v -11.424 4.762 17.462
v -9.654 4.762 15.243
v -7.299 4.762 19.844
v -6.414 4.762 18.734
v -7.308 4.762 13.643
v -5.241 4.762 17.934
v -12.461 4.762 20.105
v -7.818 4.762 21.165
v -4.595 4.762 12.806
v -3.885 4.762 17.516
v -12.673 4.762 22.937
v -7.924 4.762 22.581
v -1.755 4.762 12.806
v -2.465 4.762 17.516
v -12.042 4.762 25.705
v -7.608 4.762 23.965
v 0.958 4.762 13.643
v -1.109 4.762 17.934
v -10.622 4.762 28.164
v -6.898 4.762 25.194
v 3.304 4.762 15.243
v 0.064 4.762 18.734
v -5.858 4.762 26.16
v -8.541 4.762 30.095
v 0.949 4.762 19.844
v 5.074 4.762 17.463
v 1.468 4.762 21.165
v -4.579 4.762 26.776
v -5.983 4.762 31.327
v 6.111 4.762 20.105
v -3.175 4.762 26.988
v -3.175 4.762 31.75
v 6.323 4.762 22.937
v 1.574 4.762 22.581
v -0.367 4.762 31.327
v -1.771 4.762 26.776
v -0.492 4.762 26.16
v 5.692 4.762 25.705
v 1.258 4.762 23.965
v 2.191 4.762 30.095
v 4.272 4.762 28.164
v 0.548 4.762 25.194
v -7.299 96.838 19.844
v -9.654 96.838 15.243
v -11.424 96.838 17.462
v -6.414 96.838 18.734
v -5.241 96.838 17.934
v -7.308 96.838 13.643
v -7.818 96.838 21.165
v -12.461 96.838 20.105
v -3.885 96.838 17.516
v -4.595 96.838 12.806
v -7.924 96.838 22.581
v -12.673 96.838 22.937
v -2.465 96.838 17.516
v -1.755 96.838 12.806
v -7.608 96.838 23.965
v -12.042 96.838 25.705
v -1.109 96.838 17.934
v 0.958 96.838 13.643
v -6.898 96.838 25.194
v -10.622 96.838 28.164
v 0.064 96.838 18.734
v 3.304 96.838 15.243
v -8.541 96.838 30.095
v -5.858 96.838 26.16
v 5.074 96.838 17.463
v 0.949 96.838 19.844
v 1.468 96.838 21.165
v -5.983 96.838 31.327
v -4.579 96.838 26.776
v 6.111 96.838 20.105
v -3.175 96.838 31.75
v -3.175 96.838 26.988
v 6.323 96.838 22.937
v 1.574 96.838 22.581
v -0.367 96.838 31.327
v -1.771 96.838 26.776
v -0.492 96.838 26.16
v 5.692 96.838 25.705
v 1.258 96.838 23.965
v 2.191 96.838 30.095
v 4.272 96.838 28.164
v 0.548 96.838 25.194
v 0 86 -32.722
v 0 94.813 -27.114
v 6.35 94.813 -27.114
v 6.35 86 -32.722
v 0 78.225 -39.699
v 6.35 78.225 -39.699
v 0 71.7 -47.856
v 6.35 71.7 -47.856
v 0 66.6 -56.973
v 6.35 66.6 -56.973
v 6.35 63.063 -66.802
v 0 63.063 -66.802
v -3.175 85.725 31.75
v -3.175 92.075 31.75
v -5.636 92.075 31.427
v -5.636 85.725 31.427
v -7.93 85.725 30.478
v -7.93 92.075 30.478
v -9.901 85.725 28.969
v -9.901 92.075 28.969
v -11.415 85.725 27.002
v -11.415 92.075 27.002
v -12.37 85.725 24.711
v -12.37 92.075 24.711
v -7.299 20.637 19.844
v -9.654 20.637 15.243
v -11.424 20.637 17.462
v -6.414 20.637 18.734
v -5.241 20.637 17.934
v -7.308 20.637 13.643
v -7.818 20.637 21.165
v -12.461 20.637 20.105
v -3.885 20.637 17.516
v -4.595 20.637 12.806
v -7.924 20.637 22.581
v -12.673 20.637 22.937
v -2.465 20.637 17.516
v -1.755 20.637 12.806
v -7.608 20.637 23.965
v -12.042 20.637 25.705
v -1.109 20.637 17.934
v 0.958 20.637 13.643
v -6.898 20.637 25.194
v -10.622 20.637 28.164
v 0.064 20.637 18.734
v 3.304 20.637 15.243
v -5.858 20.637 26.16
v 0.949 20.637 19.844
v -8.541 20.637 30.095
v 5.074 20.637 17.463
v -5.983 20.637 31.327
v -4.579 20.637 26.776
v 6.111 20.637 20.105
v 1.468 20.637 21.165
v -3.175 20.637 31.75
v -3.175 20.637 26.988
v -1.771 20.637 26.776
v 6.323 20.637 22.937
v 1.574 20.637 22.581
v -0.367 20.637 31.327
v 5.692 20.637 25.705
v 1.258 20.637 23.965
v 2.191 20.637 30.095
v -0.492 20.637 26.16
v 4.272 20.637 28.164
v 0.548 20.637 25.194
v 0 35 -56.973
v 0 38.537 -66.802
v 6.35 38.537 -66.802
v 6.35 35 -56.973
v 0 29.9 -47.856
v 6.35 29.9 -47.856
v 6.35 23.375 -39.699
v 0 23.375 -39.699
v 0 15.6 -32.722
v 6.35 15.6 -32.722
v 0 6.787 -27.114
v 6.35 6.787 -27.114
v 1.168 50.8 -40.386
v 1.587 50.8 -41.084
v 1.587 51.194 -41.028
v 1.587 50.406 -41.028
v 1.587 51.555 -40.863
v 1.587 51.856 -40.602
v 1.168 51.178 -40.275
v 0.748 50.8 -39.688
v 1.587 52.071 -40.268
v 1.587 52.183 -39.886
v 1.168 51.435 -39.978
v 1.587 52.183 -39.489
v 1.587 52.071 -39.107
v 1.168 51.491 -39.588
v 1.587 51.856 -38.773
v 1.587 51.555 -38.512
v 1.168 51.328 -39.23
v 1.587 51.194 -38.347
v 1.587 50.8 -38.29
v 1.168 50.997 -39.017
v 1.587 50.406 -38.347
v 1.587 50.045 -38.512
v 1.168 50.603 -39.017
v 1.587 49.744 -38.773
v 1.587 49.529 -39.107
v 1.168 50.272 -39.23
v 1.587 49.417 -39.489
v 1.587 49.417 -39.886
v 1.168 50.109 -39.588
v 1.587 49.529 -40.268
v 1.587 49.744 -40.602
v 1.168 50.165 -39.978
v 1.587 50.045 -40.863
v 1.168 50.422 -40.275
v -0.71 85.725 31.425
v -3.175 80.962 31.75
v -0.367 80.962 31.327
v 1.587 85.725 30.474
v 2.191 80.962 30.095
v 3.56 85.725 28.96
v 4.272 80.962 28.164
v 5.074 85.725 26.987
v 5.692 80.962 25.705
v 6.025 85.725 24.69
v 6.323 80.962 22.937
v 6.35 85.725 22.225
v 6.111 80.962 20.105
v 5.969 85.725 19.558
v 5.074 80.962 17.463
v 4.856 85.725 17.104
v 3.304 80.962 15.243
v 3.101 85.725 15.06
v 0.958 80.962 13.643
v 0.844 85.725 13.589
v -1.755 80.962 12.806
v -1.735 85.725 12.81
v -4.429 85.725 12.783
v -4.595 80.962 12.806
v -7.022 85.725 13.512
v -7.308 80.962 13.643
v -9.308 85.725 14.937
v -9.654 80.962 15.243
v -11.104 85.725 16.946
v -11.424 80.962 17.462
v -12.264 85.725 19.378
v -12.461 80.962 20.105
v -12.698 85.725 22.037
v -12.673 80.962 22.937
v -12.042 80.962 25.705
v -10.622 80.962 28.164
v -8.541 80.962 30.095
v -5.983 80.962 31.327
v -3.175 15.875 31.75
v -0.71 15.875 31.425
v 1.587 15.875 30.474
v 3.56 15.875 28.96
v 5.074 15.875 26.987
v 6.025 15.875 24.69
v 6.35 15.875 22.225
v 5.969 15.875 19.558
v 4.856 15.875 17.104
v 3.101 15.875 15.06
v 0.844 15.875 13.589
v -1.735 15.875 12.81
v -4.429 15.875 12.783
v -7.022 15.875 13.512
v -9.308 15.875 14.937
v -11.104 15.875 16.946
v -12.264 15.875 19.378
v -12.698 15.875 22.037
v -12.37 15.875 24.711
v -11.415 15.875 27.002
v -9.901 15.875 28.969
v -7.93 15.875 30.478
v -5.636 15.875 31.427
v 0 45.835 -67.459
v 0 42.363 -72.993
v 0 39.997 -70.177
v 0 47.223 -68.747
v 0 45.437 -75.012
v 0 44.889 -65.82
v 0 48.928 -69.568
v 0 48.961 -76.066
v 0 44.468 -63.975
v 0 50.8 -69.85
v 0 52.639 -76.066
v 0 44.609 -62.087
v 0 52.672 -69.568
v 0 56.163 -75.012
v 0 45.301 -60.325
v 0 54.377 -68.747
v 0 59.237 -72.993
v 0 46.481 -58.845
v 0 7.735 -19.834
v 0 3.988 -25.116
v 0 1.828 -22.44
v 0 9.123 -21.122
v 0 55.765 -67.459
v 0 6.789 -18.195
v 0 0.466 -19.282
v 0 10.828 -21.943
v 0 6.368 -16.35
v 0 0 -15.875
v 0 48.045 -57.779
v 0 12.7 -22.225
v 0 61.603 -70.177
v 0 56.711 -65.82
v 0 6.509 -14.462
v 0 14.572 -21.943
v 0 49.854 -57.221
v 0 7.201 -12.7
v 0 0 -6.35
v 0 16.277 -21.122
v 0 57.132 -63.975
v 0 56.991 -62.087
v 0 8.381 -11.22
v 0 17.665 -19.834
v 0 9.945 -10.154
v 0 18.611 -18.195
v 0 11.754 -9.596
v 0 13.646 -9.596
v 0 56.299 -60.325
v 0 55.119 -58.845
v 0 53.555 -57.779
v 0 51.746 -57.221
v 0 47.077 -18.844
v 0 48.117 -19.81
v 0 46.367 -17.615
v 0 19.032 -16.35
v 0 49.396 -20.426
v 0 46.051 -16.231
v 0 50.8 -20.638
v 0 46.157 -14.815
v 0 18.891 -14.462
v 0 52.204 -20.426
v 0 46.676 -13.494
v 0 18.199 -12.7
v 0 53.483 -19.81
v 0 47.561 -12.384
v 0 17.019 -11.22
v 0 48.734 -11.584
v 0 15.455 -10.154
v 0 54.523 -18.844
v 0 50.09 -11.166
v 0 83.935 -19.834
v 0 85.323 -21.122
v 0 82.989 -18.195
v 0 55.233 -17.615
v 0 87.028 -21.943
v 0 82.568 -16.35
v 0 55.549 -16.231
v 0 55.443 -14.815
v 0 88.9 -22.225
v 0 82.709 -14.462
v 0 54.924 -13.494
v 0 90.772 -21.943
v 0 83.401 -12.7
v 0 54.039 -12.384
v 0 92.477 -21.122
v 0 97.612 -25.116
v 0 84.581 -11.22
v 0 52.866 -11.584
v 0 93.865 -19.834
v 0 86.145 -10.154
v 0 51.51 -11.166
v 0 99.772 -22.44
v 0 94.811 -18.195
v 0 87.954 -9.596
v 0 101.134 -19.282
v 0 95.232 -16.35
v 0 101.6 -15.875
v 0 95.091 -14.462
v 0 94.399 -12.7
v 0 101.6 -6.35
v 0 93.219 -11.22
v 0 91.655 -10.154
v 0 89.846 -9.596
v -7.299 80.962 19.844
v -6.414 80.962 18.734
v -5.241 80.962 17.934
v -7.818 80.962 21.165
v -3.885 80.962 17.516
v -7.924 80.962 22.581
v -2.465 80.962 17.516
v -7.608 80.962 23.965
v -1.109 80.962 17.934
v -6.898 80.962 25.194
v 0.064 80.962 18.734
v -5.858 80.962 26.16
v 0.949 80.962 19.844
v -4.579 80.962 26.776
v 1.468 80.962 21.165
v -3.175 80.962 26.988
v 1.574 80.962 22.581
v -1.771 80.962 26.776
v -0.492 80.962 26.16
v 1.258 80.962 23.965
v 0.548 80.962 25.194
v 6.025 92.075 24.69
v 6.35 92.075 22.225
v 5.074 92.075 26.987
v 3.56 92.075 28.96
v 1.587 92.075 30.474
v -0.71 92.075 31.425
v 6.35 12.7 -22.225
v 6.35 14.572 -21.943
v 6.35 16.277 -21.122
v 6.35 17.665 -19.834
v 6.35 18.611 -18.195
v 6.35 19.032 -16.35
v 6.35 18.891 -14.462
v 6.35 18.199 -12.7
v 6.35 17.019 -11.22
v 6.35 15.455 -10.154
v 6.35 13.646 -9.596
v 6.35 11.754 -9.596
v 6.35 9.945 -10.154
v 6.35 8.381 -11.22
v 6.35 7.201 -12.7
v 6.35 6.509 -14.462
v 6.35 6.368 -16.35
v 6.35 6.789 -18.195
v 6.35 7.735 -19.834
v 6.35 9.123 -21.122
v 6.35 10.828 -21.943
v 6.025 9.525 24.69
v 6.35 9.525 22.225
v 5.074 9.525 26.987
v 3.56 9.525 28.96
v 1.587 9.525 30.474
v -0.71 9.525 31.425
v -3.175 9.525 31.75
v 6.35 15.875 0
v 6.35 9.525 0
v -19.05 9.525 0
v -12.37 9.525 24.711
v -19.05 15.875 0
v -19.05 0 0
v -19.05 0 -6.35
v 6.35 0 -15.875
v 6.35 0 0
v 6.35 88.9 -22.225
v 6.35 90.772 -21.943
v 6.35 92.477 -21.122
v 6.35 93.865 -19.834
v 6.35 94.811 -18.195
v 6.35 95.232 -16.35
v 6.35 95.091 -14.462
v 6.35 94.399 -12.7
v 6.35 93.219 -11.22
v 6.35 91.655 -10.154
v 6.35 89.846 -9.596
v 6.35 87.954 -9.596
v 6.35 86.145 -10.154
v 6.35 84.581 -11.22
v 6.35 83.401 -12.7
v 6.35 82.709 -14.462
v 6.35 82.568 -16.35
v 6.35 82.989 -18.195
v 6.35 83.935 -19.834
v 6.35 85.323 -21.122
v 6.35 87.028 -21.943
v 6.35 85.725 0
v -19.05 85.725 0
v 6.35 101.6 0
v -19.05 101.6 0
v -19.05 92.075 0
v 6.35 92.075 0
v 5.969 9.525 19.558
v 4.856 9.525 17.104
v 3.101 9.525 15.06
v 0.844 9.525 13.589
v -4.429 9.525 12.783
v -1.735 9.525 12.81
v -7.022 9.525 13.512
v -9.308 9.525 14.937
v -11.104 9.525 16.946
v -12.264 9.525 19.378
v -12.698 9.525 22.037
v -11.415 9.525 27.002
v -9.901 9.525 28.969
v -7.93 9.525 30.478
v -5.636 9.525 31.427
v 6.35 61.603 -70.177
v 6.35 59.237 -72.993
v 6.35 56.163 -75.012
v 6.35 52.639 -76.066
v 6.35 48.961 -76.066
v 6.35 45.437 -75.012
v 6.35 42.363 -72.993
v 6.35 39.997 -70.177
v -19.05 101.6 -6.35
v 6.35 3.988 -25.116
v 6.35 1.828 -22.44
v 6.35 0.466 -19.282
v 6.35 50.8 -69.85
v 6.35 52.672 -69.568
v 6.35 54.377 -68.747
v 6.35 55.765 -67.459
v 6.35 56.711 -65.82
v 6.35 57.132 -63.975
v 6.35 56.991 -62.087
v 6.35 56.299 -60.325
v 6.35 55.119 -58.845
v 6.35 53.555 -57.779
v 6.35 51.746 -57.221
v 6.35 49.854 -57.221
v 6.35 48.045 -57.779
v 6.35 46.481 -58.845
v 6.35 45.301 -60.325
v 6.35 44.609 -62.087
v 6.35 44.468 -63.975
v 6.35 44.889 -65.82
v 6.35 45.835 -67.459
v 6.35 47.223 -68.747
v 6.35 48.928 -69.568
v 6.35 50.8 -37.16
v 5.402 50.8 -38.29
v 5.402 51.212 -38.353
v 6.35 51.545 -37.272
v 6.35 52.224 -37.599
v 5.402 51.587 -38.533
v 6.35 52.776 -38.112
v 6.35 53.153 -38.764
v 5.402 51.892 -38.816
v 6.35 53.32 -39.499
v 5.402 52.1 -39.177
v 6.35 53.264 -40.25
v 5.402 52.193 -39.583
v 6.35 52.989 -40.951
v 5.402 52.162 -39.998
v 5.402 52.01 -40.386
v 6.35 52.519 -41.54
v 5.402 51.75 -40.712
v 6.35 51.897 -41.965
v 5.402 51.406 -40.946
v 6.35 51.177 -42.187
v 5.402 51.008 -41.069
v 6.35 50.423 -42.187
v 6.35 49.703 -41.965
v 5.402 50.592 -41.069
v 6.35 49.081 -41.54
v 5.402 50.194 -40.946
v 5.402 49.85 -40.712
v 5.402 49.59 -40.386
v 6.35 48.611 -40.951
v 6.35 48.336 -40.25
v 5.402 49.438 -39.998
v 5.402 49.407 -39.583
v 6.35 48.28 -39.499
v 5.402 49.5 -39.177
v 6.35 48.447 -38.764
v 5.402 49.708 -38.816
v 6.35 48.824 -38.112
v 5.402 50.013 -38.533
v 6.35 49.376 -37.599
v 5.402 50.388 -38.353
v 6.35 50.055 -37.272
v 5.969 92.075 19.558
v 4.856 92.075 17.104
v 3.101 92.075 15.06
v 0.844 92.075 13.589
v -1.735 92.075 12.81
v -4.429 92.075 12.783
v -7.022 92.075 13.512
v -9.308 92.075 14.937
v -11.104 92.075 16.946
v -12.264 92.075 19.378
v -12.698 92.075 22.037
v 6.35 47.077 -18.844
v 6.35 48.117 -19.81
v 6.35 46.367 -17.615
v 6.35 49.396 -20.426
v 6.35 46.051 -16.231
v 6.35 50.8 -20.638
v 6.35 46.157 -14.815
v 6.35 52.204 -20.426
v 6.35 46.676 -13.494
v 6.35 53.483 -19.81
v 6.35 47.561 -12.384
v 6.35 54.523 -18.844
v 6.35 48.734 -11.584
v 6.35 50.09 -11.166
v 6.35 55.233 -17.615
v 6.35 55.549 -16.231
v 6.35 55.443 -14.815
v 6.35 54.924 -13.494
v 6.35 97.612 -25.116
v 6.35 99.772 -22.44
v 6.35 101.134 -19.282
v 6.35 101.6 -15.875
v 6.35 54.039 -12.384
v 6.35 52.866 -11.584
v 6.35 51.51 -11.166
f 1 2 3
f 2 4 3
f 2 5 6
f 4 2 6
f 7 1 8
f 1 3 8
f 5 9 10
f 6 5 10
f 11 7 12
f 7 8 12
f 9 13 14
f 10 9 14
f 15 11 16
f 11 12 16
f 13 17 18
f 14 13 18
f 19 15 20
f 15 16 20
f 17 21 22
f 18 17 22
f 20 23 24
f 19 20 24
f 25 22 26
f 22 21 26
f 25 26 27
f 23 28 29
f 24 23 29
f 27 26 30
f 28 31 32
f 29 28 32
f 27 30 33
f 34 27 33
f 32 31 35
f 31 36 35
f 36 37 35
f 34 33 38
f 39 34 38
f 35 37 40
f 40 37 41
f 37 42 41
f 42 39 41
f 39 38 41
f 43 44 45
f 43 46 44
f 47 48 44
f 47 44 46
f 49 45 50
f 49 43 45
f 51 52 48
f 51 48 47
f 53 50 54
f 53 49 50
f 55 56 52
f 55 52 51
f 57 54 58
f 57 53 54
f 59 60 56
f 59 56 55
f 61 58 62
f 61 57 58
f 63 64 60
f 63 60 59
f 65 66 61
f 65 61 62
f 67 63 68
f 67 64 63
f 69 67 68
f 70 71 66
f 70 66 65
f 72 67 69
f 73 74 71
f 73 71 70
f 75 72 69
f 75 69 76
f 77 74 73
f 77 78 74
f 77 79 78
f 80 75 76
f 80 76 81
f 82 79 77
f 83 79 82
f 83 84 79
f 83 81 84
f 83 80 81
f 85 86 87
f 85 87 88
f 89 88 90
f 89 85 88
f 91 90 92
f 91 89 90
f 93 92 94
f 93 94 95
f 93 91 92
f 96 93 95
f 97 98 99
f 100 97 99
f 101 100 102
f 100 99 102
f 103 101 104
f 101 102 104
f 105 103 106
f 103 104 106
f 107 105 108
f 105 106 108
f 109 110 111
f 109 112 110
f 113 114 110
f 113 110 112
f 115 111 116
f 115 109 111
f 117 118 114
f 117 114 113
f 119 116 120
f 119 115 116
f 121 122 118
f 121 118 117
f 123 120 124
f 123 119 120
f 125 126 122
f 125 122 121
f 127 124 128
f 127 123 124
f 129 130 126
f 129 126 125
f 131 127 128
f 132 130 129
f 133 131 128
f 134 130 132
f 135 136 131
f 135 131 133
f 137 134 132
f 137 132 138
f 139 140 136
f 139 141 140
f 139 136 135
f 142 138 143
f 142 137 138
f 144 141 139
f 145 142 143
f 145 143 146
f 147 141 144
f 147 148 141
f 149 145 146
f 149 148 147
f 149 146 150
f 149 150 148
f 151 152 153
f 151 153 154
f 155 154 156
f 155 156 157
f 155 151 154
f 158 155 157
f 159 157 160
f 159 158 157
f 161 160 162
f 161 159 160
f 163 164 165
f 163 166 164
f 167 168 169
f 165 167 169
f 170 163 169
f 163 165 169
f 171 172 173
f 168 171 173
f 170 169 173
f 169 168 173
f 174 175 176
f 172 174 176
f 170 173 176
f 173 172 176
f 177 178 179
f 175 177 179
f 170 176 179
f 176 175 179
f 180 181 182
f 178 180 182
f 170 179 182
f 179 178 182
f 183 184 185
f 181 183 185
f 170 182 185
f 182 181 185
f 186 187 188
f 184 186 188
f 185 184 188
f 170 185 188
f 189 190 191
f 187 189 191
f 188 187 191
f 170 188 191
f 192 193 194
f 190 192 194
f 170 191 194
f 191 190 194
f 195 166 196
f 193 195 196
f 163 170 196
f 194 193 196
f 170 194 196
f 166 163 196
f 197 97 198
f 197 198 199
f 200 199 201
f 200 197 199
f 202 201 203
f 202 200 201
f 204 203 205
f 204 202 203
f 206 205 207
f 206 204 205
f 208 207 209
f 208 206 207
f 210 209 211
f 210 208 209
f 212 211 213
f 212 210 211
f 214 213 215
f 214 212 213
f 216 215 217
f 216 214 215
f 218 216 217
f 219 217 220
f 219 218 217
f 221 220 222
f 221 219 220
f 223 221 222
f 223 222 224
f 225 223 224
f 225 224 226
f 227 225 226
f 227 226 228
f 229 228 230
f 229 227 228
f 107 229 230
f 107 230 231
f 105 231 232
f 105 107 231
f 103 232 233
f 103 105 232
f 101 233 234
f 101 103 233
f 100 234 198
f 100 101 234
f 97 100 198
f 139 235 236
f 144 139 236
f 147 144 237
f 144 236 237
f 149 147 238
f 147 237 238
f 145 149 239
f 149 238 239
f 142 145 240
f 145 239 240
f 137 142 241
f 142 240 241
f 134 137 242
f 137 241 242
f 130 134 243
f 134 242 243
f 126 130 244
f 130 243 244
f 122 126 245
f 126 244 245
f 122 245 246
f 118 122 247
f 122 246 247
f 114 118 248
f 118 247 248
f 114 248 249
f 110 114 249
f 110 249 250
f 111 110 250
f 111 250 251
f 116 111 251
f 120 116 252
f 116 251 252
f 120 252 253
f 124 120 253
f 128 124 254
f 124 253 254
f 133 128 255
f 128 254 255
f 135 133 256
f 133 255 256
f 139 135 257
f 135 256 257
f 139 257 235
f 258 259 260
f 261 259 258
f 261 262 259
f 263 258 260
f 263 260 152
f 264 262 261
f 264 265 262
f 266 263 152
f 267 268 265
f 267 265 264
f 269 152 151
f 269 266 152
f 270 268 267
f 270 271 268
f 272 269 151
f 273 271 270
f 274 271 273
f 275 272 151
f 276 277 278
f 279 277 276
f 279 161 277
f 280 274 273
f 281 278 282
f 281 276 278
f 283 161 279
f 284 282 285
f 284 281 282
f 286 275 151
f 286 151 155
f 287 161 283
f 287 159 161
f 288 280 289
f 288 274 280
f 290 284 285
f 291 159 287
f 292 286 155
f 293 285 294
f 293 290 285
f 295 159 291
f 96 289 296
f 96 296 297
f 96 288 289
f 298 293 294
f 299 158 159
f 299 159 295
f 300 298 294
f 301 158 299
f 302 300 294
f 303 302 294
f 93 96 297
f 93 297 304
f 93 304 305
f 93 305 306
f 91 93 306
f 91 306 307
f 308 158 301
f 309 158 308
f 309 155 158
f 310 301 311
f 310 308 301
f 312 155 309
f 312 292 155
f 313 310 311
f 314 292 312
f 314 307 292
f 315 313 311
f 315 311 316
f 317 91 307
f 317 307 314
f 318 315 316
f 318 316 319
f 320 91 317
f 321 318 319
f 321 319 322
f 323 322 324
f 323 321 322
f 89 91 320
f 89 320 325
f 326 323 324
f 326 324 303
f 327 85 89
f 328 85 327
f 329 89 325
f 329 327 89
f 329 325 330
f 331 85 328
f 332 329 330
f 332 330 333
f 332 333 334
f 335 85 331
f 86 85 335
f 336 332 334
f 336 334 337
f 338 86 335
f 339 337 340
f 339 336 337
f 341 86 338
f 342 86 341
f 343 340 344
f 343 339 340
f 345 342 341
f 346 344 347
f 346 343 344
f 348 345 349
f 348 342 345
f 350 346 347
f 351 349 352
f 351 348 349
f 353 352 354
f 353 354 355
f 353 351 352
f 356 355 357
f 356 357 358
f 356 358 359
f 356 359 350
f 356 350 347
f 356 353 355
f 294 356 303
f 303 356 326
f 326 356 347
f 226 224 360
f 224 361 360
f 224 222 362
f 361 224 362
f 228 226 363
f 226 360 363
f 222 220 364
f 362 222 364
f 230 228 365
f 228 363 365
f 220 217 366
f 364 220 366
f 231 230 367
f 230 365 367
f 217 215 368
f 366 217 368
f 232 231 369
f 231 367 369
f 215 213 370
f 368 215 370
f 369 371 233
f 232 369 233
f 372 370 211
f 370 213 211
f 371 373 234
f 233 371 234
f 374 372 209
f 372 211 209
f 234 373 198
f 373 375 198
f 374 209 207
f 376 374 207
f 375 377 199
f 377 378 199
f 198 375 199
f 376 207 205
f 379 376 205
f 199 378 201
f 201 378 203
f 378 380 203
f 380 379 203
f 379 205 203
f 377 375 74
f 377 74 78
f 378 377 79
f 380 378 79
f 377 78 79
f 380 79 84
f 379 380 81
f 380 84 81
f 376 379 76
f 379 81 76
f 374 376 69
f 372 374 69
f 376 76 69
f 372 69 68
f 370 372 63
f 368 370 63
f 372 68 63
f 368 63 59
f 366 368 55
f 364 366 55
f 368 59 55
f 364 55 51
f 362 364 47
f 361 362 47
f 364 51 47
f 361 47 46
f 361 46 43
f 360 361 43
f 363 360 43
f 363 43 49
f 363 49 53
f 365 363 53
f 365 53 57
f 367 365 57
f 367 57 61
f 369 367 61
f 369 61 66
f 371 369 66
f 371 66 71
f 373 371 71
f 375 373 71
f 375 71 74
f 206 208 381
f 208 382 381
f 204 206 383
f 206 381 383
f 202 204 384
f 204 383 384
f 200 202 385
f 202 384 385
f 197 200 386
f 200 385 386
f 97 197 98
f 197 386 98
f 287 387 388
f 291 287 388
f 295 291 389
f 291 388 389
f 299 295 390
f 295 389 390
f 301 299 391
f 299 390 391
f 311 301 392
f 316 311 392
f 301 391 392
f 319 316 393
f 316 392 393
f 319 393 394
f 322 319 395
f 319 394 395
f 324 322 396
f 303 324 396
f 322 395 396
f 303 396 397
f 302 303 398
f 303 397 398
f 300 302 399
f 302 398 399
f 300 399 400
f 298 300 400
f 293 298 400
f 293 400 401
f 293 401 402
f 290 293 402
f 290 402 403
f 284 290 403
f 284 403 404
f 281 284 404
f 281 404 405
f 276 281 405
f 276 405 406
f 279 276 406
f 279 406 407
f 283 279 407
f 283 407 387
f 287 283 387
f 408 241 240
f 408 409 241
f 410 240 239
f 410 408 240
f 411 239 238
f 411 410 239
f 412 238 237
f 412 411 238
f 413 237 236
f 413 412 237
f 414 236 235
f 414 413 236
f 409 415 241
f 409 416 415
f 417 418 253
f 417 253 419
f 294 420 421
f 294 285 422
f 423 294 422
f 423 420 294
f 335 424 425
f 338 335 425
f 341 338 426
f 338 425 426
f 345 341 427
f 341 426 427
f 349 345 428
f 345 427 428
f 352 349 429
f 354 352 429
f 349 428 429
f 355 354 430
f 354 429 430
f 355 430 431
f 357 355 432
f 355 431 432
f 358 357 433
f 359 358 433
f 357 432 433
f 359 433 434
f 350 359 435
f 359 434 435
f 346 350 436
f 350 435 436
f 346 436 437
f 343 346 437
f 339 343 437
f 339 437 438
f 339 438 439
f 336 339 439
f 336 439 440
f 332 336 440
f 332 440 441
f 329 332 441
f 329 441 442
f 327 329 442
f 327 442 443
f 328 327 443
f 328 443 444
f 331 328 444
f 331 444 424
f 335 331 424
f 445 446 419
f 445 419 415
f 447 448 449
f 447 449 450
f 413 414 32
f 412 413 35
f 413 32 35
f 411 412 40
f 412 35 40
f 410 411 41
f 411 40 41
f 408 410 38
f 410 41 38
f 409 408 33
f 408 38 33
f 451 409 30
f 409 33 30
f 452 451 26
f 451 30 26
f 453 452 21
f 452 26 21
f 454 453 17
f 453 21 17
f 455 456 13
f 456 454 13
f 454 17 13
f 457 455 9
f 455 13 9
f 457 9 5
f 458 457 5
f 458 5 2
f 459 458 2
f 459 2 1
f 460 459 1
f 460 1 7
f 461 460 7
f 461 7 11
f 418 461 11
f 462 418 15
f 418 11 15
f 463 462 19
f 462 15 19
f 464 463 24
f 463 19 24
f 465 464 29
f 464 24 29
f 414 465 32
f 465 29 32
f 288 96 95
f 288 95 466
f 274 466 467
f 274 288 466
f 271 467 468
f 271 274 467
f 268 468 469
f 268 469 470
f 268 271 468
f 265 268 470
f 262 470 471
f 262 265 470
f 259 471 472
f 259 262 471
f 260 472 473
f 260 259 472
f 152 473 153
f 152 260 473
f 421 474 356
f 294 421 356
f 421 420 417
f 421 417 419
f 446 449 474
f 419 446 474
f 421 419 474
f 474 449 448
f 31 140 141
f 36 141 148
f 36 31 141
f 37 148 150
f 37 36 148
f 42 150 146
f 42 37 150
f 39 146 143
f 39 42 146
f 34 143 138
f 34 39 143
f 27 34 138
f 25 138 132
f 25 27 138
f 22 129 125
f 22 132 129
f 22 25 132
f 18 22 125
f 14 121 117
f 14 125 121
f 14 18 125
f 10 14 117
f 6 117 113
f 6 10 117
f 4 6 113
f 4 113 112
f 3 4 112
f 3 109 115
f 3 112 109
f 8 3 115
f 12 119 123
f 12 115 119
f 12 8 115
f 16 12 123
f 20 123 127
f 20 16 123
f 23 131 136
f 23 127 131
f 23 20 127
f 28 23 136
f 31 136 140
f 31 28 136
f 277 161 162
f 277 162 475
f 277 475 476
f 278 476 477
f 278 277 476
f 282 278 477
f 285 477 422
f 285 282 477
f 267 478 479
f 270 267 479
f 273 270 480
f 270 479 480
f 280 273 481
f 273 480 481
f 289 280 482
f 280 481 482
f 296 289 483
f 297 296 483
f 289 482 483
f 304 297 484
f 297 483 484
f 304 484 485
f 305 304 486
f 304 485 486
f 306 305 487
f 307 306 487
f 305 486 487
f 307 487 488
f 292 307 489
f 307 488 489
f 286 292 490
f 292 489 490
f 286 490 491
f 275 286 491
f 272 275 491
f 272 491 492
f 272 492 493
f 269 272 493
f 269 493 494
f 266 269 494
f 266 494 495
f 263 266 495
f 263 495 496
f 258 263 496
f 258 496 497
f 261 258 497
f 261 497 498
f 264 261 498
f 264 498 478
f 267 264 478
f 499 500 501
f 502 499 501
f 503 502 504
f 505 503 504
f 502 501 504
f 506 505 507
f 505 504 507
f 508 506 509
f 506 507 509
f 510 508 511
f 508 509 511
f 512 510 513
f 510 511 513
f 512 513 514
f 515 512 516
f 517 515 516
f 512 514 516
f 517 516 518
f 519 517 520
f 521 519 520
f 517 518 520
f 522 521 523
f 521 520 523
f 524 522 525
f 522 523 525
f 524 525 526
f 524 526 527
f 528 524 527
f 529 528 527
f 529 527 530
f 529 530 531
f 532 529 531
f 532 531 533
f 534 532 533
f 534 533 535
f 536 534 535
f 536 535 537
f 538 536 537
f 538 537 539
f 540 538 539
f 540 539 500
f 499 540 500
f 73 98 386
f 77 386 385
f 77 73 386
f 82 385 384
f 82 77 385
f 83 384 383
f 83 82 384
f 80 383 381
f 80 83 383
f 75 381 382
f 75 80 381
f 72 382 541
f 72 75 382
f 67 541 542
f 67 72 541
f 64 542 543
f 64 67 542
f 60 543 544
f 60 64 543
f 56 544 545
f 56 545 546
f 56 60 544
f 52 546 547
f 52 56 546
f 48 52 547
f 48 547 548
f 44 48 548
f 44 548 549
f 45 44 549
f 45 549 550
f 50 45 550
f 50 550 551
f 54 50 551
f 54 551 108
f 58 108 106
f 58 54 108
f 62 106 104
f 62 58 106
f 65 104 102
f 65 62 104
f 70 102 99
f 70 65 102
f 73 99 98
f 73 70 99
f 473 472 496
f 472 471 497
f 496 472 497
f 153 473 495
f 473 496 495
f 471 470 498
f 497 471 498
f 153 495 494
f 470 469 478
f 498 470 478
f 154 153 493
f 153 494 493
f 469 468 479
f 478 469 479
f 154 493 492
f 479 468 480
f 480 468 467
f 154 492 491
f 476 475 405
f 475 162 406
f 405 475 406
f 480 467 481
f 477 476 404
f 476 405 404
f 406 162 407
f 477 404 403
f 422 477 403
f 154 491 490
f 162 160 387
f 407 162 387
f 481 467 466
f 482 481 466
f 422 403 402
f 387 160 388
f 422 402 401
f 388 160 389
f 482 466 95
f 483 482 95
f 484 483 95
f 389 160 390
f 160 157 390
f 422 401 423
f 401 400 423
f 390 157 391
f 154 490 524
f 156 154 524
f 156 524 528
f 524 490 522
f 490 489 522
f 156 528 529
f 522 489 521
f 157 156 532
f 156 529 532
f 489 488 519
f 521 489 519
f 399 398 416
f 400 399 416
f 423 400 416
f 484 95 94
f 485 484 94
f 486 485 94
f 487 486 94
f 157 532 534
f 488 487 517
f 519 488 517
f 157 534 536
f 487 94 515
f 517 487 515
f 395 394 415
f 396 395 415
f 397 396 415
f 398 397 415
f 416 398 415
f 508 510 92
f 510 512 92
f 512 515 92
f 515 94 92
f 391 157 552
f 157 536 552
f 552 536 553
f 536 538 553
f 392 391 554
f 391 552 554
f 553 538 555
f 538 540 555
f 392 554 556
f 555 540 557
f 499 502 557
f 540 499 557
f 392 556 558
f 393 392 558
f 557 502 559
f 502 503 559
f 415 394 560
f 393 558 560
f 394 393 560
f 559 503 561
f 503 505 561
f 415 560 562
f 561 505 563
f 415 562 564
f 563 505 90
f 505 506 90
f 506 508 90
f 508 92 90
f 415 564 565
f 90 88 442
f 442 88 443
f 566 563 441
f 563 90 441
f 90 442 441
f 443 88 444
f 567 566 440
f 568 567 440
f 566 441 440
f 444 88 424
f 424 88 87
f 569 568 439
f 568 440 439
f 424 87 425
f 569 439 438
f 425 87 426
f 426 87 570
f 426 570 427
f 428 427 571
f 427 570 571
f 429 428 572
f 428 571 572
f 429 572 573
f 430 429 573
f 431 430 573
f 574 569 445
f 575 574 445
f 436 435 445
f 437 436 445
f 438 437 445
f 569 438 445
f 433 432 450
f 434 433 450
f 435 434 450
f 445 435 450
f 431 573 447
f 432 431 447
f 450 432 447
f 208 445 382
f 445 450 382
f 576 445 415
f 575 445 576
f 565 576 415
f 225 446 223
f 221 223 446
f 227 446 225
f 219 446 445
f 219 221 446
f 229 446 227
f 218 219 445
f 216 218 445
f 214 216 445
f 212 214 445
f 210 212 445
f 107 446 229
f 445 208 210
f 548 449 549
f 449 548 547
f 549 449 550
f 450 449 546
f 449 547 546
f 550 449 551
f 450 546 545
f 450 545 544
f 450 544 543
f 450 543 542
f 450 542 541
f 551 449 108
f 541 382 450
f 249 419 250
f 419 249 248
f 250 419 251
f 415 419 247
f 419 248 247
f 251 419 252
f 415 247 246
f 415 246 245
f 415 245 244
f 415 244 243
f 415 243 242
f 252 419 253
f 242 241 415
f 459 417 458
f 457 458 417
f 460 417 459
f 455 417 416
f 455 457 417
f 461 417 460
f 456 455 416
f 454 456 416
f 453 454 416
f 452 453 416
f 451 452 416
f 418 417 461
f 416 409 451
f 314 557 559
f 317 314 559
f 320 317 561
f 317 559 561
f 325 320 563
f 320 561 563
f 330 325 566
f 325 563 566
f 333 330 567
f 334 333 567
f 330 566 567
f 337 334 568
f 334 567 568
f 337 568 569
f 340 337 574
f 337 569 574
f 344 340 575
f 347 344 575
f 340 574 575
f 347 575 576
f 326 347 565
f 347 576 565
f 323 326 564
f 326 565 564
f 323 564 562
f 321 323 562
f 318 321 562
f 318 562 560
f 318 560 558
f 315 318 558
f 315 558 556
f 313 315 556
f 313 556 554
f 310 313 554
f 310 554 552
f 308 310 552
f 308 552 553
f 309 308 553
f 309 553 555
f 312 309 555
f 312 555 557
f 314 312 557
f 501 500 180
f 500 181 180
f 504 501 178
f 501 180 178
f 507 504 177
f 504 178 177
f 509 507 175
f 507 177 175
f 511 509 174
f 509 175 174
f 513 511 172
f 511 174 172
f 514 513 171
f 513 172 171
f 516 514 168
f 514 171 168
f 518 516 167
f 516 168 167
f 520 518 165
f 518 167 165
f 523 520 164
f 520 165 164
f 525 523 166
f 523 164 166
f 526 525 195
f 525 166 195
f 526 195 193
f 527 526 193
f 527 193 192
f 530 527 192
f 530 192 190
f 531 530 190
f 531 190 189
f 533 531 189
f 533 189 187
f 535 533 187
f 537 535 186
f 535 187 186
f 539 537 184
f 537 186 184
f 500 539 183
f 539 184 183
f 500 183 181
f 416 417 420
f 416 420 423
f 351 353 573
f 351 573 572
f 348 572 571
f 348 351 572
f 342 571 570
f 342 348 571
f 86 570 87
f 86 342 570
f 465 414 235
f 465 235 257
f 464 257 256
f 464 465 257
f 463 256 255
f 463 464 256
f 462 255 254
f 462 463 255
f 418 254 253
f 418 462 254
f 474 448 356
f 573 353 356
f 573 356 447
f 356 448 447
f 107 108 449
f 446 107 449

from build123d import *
from build123d.topology import SkipClean

# Parameters (mm, degrees)
BASE_EXTRUDE_DEPTH                                = 6.35
SKETCH4_R                                         = 6.35
SKETCH4_R_2                                       = 4.7625
CUT_EXTRUDE1_DEPTH                                = 128.158650905
SKETCH3_W                                         = 25.4
SKETCH3_H                                         = 101.6
BOSS_EXTRUDE1_DEPTH                               = 6.35
BOSS_EXTRUDE2_DEPTH                               = 3.175
SKETCH6_R                                         = 9.525
BOSS_EXTRUDE3_DEPTH                               = 7.9375
SKETCH7_R                                         = 4.7625
CUT_EXTRUDE2_DEPTH                                = 125.686983708
CSK_FOR_3_FLAT_HEAD_MACHINE_SCREW_100_D           = 2.794
CSK_FOR_3_FLAT_HEAD_MACHINE_SCREW_100_DEPTH       = 4.7625
CSK_FOR_3_FLAT_HEAD_MACHINE_SCREW_100_CSINK_D     = 5.0546
CSK_FOR_3_FLAT_HEAD_MACHINE_SCREW_100_CSINK_ANGLE = 100
CSK_FOR_3_FLAT_HEAD_MACHINE_SCREW_100_TIP         = 0.839402285


with BuildPart() as part:
    # Sketch2 → Base-Extrude (new body)
    with BuildSketch(Plane(origin=(0, 0, 0), x_dir=(0, 0, -1), z_dir=(1, 0, 0))):
        with BuildLine():
            Line((0, 0), (0, 101.6))
            Line((0, 101.6), (15.875, 101.6))
            ThreePointArc((15.875, 101.6), (22.439736017, 99.771717483), (27.114363043, 94.813266304))
            ThreePointArc((27.114363043, 94.813266304), (43.64304274, 74.794428425), (66.801863043, 63.063266304))
            ThreePointArc((66.801863043, 63.063266304), (76.2, 50.8), (66.801863043, 38.536733696))
            ThreePointArc((66.801863043, 38.536733696), (43.64304274, 26.805571575), (27.114363043, 6.786733696))
            ThreePointArc((27.114363043, 6.786733696), (22.439736017, 1.828282517), (15.875, 0))
            Line((15.875, 0), (0, 0))
        make_face()
    extrude(amount=BASE_EXTRUDE_DEPTH)

    # Sketch4 → Cut-Extrude1 (cut, through all)
    with BuildSketch(Plane(origin=(6.35, 0, 0), x_dir=(0, 0, -1), z_dir=(1, 0, 0))):
        with Locations((63.5, 50.8)):
            Circle(SKETCH4_R)
        with Locations((15.875, 88.9)):
            Circle(SKETCH4_R)
        with Locations((15.875, 12.7)):
            Circle(SKETCH4_R)
        with Locations((15.875, 50.8)):
            Circle(SKETCH4_R_2)
    extrude(amount=-CUT_EXTRUDE1_DEPTH, mode=Mode.SUBTRACT)

    # Sketch3 → Boss-Extrude1 (add)
    with BuildSketch(Plane.XY):
        with Locations((-6.35, 50.8)):
            Rectangle(SKETCH3_W, SKETCH3_H)
    extrude(amount=-BOSS_EXTRUDE1_DEPTH)

    # Sketch5 → Boss-Extrude2 (add, symmetric)
    with BuildSketch(Plane(origin=(0, 88.9, 0), x_dir=(-1, 0, 0), z_dir=(0, 1, 0))):
        with BuildLine():
            Line((19.05, 0), (-6.35, 0))
            Line((-6.35, 0), (-6.35, 22.225))
            ThreePointArc((-6.35, 22.225), (1.921253552, 31.667126076), (12.369946424, 24.710676017))
            Line((12.369946424, 24.710676017), (19.05, 0))
        make_face()
    boss_extrude2 = extrude(amount=BOSS_EXTRUDE2_DEPTH, both=True)

    # Sketch6 → Boss-Extrude3 (add, symmetric)
    with SkipClean():  # the faces are left unmerged after this step: merging them gives an invalid solid
        with BuildSketch(Plane(origin=(0, 88.9, 0), x_dir=(-1, 0, 0), z_dir=(0, 1, 0))):
            with Locations(Location((3.175, 22.225, 0), (0, 0, 90))):
                Circle(SKETCH6_R)
        boss_extrude3 = extrude(amount=BOSS_EXTRUDE3_DEPTH, both=True)

    # Sketch7 → Cut-Extrude2 (cut, through all)
    with SkipClean():  # the faces are left unmerged after this step: merging them gives an invalid solid
        with BuildSketch(Plane(origin=(0, 96.8375, 0), x_dir=(-1, 0, 0), z_dir=(0, 1, 0))):
            with Locations(Location((3.175, 22.225, 0), (0, 0, 90))):
                Circle(SKETCH7_R)
        cut_extrude2 = extrude(amount=-CUT_EXTRUDE2_DEPTH, mode=Mode.SUBTRACT)

    # Mirror2: Boss-Extrude2, Boss-Extrude3, Cut-Extrude2 across plane
    with SkipClean():  # the faces are left unmerged after this step: merging them gives an invalid solid
        add(boss_extrude2.mirror(Plane.ZX.offset(50.8)))
        add(boss_extrude3.mirror(Plane.ZX.offset(50.8)))
        add(cut_extrude2.mirror(Plane.ZX.offset(50.8)), mode=Mode.SUBTRACT)

    # CSK for #3 Flat Head Machine Screw (100)1
    with Locations(Plane(origin=(6.35, 0, 0), x_dir=(0, 0, -1), z_dir=(1, 0, 0))):
        with Locations((39.6875, 50.8)):
            CounterSinkHole(CSK_FOR_3_FLAT_HEAD_MACHINE_SCREW_100_D / 2, CSK_FOR_3_FLAT_HEAD_MACHINE_SCREW_100_CSINK_D / 2, depth=CSK_FOR_3_FLAT_HEAD_MACHINE_SCREW_100_DEPTH, counter_sink_angle=CSK_FOR_3_FLAT_HEAD_MACHINE_SCREW_100_CSINK_ANGLE)
            with Locations((0, 0, -(CSK_FOR_3_FLAT_HEAD_MACHINE_SCREW_100_DEPTH + CSK_FOR_3_FLAT_HEAD_MACHINE_SCREW_100_TIP / 2))):  # 118° drill point
                Cone(0, CSK_FOR_3_FLAT_HEAD_MACHINE_SCREW_100_D / 2, CSK_FOR_3_FLAT_HEAD_MACHINE_SCREW_100_TIP, mode=Mode.SUBTRACT)


solid = part.part
